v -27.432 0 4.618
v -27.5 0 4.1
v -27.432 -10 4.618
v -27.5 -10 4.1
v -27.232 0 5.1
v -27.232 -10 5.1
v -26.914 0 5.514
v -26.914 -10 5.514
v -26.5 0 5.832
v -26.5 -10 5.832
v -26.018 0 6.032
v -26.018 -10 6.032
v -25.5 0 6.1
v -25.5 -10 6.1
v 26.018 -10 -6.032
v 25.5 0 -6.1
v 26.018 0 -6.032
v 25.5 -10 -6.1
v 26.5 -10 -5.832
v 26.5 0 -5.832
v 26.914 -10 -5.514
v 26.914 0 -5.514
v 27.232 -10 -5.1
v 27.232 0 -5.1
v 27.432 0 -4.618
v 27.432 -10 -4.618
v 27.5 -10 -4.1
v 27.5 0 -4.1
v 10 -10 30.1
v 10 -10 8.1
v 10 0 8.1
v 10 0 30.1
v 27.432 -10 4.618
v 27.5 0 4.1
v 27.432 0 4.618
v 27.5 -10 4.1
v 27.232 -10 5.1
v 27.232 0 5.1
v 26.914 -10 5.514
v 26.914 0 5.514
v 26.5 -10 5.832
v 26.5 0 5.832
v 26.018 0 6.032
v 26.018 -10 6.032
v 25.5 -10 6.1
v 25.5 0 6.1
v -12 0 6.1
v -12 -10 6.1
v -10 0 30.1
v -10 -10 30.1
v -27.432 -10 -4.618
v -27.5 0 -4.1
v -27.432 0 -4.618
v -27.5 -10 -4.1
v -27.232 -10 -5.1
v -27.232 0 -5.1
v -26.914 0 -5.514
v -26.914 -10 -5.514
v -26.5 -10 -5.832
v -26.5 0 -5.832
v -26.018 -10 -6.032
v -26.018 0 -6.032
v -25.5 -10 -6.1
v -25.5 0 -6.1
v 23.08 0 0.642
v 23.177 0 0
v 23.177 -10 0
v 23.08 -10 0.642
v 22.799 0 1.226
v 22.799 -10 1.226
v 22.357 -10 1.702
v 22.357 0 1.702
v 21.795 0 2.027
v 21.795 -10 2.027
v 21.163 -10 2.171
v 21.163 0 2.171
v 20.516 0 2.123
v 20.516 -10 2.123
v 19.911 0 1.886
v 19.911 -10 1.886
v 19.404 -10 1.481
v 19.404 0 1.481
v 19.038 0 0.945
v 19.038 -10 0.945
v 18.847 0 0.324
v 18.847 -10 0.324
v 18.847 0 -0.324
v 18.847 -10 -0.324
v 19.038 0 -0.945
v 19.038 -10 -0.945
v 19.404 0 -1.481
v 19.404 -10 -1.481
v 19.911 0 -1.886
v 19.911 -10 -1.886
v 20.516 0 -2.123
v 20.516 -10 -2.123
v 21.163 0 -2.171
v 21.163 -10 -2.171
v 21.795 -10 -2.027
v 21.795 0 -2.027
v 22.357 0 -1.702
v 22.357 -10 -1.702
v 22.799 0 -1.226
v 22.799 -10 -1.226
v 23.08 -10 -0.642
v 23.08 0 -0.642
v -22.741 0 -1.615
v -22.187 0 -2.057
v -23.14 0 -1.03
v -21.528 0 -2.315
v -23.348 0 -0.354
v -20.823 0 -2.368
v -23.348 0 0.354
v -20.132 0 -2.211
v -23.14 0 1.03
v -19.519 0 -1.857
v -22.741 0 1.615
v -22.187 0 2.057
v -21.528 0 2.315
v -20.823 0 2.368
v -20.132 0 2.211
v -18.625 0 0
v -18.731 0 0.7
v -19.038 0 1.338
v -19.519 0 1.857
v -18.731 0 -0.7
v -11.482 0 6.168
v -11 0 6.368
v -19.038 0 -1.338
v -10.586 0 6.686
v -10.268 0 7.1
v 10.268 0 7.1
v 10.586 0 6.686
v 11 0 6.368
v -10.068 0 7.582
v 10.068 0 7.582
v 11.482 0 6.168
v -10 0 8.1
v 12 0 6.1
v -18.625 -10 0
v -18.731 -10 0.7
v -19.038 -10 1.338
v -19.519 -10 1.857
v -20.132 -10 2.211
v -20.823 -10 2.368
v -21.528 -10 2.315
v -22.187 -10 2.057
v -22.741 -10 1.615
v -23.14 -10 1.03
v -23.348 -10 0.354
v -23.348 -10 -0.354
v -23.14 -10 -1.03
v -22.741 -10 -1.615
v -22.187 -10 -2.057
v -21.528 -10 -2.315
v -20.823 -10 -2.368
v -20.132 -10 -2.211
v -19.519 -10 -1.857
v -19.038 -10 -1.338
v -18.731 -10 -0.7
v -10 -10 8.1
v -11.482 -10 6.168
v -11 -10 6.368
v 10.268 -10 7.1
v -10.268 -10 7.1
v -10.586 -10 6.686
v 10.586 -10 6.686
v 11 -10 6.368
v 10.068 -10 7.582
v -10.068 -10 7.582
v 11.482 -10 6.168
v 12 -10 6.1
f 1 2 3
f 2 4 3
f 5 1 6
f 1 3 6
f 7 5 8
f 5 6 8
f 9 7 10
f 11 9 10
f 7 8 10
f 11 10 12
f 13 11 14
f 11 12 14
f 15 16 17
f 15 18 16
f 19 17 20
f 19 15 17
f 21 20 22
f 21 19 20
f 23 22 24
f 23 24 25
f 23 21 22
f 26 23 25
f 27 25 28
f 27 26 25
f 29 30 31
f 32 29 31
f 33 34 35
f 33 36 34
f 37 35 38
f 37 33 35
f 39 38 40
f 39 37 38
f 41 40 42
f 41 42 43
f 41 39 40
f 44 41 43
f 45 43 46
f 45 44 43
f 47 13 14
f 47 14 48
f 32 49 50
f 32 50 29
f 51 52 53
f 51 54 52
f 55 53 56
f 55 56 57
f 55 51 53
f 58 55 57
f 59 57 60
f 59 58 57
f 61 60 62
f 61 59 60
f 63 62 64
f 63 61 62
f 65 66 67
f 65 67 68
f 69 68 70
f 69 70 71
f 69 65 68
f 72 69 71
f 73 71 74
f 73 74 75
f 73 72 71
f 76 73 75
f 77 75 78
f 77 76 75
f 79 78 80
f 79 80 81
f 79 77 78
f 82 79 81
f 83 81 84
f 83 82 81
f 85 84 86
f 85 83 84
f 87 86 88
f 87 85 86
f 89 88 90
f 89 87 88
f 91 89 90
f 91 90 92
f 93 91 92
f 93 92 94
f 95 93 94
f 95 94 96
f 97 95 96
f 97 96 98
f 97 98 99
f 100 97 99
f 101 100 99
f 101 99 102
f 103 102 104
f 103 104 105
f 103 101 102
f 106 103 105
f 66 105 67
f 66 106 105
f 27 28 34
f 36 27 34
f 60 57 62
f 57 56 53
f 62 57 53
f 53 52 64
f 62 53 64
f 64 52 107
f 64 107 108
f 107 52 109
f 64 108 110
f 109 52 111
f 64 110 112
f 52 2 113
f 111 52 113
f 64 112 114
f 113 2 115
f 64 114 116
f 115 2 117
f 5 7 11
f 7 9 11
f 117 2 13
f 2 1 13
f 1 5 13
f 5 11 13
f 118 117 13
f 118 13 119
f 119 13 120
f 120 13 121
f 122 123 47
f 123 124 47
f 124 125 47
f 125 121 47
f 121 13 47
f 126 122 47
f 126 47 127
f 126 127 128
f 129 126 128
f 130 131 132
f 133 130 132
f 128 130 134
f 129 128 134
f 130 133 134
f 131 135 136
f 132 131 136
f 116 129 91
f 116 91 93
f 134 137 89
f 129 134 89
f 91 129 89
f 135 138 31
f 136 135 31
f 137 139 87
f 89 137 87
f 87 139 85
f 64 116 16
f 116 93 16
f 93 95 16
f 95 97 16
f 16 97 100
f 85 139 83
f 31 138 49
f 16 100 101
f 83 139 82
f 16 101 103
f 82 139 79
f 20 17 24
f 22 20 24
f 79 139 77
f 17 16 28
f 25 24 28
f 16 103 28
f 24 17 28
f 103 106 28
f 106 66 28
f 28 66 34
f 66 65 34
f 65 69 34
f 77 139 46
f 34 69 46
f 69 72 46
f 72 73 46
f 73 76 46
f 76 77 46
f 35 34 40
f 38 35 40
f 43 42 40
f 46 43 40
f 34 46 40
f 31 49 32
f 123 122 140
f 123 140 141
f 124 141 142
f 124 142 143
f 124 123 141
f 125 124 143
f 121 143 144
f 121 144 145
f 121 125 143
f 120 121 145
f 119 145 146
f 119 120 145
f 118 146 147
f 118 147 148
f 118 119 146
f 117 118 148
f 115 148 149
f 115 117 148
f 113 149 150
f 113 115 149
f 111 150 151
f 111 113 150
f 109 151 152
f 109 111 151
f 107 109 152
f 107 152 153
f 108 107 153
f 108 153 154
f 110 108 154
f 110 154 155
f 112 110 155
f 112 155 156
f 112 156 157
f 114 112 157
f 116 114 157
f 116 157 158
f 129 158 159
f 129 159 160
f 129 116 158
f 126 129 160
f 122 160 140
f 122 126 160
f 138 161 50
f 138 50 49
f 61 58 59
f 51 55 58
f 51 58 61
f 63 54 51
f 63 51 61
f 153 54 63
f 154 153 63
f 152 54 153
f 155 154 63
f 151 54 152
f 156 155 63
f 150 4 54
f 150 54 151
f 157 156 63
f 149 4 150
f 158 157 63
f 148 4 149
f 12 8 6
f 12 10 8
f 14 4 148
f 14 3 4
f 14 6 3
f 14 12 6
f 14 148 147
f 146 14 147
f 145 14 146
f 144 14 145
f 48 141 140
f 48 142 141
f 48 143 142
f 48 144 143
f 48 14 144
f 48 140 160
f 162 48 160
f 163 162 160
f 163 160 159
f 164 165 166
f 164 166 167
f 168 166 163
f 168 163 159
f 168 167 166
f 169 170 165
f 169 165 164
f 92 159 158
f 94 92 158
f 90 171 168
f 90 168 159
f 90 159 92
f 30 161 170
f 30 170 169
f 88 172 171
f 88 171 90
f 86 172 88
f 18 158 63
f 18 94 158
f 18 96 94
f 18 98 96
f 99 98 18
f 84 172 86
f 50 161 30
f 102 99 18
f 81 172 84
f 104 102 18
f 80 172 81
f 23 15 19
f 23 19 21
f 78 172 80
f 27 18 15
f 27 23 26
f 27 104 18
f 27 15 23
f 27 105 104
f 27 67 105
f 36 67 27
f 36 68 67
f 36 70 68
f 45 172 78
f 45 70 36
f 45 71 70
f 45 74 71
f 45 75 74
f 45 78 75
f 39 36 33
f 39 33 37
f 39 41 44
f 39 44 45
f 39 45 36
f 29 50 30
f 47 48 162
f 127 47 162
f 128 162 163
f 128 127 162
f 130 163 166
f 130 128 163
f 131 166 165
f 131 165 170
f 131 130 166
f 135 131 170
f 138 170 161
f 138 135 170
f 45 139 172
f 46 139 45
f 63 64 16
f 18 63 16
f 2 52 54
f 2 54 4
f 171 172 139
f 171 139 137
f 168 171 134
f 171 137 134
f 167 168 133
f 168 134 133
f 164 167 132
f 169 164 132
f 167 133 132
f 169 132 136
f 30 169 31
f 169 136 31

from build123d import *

# Parameters (mm, degrees)
F0_W     = 55
F0_H     = 12.2
F0_R     = 2.374951393
F0_R_2   = 2.1771962512
F1_DEPTH = 10
F2_W     = 20
F2_H     = 10
F3_DEPTH = 24
F4_R     = 2


with BuildPart() as f1:
    # F0 (on Front) → F1 (new body)
    with BuildSketch(Plane.XZ):
        Rectangle(F0_W, F0_H)
        with Locations((-21, 0)):
            Circle(F0_R, mode=Mode.SUBTRACT)
        with Locations((21, 0)):
            Circle(F0_R_2, mode=Mode.SUBTRACT)
    extrude(amount=F1_DEPTH)

    # F2 (on face) → F3 (join)
    with BuildSketch(Plane.XY.offset(6.1)):
        with Locations((0, -5)):
            Rectangle(F2_W, F2_H)
    extrude(amount=F3_DEPTH)

    # F4
    f4_edges = [f1.edges().sort_by_distance(p)[0] for p in [
        (10, -5, 6.1),
        (27.5, -5, 6.1),
        (27.5, -5, -6.1),
        (-10, -5, 6.1),
        (-27.5, -5, 6.1),
        (-27.5, -5, -6.1),
    ]]
    fillet(f4_edges, radius=F4_R)


solid = f1.part
